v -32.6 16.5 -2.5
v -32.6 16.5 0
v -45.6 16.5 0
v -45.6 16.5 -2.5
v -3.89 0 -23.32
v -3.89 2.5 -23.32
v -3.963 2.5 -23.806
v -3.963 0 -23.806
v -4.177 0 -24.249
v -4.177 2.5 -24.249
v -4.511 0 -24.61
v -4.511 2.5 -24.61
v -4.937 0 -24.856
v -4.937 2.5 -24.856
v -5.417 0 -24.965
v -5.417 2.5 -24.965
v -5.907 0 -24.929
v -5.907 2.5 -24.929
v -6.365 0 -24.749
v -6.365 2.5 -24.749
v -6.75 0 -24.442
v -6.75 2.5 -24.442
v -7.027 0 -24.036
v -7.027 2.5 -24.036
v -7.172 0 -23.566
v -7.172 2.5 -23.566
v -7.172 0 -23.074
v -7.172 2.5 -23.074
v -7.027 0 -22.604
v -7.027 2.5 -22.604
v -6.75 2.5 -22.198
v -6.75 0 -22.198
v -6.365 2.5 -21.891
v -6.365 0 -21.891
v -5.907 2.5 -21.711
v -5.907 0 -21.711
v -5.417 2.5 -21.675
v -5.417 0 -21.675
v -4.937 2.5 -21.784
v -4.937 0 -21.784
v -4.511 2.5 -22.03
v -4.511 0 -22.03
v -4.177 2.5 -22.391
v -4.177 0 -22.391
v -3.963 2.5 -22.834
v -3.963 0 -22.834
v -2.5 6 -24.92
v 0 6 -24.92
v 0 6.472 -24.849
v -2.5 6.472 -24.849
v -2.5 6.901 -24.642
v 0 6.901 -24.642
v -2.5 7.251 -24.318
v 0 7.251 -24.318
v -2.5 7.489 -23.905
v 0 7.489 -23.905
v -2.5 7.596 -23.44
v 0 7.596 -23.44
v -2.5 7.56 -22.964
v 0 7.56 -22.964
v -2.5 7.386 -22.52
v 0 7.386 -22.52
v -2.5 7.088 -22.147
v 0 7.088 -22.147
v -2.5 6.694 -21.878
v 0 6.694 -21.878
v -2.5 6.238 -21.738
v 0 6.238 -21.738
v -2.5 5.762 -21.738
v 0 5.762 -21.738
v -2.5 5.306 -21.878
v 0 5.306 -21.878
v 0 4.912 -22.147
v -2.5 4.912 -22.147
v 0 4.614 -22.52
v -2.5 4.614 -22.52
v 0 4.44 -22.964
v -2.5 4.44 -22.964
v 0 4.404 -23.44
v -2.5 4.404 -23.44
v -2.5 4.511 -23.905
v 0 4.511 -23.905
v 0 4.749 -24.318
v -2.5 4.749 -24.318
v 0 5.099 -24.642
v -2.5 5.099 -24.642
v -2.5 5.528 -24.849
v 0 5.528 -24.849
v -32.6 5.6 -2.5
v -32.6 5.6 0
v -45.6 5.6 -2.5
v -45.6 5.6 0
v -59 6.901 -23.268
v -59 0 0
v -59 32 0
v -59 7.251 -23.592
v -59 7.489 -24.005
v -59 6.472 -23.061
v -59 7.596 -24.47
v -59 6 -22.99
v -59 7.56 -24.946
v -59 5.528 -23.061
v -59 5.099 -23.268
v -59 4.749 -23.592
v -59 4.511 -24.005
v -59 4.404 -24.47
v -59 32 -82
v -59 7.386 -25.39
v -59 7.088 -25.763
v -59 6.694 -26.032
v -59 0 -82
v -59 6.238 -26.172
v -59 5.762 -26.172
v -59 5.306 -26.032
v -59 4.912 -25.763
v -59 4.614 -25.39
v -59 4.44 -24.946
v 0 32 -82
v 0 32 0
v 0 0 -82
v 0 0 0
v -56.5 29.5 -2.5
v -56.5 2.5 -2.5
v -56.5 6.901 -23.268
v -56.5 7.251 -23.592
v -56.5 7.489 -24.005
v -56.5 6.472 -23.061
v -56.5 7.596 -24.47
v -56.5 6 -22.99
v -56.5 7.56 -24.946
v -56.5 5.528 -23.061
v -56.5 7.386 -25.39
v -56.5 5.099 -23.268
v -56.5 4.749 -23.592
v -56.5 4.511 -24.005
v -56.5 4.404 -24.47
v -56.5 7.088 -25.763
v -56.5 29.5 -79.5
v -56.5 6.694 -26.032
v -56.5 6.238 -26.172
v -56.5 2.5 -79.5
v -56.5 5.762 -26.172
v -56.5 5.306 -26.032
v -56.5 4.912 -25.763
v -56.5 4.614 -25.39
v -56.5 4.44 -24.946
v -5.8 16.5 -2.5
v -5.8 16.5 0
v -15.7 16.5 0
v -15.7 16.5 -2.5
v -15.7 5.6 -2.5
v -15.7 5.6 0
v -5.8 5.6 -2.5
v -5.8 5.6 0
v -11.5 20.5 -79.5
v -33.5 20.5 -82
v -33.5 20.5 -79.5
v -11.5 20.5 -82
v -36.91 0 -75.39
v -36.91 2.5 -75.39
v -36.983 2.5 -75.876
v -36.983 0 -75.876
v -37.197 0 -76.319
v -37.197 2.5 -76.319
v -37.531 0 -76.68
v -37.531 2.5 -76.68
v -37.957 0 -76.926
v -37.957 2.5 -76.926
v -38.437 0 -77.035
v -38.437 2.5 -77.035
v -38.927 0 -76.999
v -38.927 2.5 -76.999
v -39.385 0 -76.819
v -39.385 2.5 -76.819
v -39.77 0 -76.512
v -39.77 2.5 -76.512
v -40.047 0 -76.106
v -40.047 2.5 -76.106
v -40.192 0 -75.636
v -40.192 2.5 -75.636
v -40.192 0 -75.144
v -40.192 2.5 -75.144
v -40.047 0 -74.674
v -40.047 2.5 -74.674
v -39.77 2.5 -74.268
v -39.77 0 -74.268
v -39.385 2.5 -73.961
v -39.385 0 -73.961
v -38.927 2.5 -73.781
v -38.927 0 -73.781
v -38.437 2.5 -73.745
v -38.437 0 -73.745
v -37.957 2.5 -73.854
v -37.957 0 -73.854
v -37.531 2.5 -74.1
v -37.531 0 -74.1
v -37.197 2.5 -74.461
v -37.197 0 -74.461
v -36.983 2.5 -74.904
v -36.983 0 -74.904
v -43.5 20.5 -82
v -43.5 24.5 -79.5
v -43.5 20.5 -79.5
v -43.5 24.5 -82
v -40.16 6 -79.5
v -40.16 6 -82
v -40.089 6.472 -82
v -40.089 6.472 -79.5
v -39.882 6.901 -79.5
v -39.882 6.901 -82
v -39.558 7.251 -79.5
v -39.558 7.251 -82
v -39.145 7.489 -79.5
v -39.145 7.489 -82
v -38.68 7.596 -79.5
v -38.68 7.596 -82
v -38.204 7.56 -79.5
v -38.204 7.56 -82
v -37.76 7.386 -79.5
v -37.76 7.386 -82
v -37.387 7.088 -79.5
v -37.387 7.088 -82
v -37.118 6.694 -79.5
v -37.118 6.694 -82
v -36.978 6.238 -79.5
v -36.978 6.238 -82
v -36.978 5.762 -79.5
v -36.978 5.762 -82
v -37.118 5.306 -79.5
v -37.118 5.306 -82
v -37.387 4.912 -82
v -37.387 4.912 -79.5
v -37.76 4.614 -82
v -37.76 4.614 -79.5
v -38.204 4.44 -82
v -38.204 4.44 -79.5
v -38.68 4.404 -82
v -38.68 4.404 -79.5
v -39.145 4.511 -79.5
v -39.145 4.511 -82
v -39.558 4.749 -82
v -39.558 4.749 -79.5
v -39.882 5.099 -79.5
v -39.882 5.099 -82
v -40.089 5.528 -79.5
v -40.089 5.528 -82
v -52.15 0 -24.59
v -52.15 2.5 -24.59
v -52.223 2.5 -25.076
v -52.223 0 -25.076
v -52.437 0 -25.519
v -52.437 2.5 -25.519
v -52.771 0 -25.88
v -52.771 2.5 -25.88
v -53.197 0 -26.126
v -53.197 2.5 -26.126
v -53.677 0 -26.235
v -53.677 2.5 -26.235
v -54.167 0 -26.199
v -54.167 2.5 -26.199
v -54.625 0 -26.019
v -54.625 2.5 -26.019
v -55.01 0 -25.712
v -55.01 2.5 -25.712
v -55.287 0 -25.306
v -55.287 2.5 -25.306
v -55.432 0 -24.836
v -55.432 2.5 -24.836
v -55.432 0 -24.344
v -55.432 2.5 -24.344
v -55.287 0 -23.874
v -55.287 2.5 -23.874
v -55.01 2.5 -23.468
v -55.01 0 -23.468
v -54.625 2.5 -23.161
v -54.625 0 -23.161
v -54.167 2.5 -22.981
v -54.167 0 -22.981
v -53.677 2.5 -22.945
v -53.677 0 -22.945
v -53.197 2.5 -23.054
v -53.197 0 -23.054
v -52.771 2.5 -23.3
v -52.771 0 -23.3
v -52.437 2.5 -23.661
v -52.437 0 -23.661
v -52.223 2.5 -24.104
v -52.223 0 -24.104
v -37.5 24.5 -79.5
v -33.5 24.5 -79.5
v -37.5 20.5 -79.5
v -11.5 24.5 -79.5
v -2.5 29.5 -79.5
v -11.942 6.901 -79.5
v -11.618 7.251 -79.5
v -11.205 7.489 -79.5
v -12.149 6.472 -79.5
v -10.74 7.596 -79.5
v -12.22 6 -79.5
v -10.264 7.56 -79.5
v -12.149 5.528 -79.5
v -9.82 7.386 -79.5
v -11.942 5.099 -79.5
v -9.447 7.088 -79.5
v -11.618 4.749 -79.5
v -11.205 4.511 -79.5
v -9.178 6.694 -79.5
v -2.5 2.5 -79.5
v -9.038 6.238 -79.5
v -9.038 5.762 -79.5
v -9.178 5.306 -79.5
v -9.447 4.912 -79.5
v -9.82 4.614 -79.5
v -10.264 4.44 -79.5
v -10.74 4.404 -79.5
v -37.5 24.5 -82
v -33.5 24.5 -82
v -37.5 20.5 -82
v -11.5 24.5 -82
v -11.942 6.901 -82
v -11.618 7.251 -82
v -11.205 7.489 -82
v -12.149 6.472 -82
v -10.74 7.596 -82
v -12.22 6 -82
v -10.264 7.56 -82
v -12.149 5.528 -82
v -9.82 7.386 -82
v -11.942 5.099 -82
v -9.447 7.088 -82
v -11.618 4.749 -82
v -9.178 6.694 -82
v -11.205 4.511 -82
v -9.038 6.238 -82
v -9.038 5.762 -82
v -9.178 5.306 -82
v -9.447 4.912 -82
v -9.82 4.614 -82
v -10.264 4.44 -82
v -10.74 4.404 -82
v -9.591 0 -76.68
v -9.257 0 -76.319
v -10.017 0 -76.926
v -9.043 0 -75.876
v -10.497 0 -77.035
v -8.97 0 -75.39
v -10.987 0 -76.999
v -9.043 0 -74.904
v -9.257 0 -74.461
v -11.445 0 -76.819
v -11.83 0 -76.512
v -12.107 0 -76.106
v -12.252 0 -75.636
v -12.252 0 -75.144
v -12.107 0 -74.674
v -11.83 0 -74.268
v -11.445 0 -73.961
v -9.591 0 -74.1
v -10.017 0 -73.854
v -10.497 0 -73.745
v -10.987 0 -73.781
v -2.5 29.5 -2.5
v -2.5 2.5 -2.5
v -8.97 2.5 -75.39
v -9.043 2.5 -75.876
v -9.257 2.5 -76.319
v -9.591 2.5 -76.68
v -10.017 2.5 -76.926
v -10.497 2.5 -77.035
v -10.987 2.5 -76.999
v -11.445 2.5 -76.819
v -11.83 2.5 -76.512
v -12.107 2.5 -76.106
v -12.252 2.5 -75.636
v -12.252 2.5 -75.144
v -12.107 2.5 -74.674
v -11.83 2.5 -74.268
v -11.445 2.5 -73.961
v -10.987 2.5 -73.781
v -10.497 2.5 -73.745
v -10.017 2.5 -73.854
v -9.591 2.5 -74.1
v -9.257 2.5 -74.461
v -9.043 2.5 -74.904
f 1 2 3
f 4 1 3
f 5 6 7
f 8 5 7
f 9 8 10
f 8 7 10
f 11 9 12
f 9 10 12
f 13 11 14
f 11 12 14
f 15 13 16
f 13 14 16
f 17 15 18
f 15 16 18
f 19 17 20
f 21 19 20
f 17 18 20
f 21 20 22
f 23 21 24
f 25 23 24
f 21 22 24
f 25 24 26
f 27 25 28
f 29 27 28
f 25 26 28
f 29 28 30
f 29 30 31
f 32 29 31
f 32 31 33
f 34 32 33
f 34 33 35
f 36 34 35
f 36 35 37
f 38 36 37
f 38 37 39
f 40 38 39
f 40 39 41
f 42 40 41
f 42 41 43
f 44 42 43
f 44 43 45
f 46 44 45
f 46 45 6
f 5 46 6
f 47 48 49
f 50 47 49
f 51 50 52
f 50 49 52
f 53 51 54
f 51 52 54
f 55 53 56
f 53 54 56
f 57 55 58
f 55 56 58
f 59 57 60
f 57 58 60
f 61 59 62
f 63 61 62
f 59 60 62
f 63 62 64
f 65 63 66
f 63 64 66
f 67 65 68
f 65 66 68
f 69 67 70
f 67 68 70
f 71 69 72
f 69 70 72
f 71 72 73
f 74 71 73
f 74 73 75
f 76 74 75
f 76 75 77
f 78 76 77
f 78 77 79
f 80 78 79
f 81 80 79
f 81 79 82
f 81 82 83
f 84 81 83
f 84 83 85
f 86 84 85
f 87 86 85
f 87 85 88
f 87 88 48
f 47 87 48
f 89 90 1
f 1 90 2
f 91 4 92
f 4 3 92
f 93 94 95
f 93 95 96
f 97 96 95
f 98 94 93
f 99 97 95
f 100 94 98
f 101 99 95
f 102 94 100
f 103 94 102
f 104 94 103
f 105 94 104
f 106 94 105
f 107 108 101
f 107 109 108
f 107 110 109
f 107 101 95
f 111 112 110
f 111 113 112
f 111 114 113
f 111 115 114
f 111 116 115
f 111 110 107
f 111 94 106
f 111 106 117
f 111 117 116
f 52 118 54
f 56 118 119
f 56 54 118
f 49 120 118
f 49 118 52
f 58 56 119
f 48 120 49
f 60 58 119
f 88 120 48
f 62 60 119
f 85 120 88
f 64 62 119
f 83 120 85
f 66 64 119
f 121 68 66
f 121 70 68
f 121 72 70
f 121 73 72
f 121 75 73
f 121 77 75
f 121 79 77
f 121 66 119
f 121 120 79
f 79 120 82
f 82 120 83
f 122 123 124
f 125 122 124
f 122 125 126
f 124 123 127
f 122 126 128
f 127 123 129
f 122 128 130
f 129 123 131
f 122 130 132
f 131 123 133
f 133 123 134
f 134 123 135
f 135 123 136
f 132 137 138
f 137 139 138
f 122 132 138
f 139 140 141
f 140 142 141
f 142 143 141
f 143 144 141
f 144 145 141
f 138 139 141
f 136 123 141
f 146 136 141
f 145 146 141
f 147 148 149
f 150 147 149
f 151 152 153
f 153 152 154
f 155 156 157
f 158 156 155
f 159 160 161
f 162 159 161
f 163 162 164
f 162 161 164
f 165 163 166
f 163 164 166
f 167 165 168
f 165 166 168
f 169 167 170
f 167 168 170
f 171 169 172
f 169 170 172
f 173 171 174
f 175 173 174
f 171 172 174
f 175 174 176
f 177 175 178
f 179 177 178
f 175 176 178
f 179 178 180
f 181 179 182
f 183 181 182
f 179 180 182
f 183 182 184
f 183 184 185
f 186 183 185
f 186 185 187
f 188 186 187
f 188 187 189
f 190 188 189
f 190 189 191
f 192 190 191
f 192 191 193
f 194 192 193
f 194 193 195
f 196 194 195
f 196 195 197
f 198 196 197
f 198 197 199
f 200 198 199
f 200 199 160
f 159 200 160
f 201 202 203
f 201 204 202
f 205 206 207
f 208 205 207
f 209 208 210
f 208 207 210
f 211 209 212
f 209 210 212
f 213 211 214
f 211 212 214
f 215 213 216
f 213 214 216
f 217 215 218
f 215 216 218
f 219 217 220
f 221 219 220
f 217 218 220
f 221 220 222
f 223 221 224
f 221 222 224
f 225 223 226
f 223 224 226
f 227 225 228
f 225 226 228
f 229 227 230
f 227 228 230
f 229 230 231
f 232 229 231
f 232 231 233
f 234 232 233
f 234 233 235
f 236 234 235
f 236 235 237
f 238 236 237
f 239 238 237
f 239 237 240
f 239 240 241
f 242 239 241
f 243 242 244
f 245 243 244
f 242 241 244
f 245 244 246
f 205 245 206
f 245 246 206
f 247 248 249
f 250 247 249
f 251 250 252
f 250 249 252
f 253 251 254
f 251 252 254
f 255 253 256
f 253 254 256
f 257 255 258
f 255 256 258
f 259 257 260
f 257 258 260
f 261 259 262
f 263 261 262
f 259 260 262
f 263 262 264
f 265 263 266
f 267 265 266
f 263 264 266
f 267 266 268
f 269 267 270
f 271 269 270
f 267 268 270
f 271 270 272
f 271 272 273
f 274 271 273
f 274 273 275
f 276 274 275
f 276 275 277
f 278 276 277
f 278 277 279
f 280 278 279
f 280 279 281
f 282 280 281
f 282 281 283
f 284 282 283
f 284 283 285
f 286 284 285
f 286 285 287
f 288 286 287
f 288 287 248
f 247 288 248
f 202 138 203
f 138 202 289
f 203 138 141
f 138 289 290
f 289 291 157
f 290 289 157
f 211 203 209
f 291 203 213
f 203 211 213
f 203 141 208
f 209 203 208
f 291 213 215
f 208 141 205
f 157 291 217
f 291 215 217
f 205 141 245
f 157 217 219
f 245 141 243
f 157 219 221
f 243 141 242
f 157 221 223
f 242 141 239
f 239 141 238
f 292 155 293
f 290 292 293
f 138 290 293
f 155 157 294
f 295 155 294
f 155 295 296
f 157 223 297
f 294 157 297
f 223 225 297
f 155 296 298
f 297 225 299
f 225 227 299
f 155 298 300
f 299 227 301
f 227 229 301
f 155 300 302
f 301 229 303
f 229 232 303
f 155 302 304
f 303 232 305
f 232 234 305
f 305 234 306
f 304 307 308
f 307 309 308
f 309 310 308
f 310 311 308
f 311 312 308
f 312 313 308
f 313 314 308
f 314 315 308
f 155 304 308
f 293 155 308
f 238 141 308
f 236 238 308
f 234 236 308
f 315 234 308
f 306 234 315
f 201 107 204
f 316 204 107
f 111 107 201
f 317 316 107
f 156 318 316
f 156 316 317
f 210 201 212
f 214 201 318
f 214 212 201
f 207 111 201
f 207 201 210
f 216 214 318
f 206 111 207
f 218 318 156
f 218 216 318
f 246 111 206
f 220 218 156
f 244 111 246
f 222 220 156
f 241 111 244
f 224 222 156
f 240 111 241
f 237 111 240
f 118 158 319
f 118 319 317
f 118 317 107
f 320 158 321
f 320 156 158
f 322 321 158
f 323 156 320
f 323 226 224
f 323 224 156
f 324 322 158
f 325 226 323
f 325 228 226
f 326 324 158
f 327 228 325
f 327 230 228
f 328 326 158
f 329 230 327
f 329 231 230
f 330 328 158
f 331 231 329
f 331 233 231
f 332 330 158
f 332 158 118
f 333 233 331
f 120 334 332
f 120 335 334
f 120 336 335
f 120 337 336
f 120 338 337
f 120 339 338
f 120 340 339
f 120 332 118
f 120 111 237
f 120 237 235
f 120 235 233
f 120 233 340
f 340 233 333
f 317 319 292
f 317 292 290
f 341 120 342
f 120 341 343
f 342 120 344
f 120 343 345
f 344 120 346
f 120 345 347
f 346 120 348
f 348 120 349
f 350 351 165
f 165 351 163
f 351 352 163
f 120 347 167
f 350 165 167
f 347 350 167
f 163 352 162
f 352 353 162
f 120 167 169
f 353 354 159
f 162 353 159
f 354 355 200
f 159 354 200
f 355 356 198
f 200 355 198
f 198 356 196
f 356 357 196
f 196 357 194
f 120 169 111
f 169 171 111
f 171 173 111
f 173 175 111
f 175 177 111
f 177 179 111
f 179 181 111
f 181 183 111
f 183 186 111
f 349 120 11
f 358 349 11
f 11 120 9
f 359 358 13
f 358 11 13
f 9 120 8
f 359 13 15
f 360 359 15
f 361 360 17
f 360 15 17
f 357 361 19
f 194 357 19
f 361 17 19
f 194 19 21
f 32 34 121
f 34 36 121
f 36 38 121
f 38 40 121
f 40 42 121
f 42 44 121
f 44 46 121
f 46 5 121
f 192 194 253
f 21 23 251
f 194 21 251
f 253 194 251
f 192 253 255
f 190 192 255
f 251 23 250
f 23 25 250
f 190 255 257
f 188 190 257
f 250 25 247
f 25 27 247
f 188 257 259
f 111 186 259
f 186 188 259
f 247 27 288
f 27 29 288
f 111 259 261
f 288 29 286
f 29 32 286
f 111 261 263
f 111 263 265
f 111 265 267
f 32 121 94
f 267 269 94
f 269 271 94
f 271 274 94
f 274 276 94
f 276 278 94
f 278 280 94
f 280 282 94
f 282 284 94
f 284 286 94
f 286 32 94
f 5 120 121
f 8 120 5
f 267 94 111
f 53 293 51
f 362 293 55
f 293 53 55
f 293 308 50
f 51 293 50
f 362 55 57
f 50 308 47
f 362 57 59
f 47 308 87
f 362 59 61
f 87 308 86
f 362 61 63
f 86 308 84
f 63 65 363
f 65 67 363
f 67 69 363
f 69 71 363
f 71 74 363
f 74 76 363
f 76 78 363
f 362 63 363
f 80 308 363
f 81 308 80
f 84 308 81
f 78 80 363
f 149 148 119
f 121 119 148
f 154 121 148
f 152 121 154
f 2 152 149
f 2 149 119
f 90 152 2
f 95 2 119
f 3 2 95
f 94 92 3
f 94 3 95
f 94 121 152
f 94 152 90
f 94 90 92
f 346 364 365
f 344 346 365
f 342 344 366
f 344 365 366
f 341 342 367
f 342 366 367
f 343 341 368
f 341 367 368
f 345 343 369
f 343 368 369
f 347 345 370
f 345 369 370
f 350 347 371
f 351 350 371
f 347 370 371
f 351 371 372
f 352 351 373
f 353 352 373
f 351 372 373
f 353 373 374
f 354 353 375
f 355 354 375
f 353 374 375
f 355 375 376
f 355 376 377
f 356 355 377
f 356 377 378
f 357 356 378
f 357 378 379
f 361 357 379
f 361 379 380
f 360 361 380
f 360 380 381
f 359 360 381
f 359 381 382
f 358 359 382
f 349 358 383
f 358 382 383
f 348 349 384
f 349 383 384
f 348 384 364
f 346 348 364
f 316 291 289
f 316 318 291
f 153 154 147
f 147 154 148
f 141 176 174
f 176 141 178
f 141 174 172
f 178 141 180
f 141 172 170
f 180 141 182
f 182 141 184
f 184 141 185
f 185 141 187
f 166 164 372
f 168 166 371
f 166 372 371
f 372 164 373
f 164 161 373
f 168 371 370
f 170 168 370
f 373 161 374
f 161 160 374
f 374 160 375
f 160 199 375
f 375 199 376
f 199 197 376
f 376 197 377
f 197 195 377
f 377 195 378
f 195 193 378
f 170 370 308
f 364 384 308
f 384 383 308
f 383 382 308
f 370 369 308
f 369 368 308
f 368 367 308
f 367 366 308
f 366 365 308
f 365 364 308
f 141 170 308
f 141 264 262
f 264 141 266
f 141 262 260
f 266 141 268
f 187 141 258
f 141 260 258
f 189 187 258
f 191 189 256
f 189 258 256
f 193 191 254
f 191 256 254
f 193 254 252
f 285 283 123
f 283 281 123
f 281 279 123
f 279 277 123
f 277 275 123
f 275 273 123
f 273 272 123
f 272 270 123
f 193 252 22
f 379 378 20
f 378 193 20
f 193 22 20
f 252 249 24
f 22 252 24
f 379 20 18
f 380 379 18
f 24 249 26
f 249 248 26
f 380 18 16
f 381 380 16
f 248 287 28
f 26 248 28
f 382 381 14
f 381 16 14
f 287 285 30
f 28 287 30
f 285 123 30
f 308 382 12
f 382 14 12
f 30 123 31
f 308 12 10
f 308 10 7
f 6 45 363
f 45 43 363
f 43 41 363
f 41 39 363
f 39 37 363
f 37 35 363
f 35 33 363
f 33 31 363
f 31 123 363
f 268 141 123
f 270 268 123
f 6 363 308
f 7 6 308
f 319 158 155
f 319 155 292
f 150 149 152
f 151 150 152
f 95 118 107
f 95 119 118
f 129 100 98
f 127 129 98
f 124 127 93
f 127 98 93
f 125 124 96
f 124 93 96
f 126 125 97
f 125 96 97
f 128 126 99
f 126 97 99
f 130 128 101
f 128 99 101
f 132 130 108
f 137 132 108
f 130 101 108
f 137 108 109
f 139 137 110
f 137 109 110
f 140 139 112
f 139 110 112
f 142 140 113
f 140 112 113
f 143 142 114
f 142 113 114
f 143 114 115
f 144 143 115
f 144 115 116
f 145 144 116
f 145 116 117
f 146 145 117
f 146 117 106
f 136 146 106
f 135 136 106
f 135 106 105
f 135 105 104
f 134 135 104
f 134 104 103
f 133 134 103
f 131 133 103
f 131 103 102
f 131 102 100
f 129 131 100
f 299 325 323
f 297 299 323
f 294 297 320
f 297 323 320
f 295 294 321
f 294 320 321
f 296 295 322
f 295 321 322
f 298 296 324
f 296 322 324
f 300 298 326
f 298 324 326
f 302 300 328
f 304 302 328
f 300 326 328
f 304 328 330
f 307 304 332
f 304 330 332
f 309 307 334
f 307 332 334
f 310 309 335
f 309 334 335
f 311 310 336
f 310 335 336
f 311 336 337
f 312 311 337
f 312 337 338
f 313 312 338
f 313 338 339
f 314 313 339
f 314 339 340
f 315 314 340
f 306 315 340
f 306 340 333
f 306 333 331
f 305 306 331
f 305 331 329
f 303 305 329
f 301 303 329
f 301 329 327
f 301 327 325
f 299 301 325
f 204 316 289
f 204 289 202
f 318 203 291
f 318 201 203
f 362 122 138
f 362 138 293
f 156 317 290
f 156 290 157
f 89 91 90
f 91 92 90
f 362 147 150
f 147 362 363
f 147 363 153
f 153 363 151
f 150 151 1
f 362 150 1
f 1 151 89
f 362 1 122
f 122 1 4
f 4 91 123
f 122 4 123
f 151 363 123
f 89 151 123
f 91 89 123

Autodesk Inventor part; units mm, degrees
ref_plane "YZ Plane" through (0, 0, 0) normal (1, 0, 0) x (0, 1, 0)
ref_plane "XZ Plane" through (0, 0, 0) normal (0, 1, 0) x (-1, 0, 0)
sketch "Sketch1" plane through (0, 0, 0) normal (0, 1, 0) x (-1, 0, 0)
  line L0 (0, 0) -> (59, 0)
  line L1 (59, 0) -> (59, -82)
  line L2 (59, -82) -> (0, -82)
  line L3 (0, -82) -> (0, 0)
  dimension "d0" = 82
  dimension "d1" = 59
extrude "Extrusion1" add sketch "Sketch1" along normal blind 32
ref_plane "Work Plane1" through (0, 2.5, 0) normal (0, -1, 0) x (1, 0, 0)
sketch "Sketch2" plane through (0, 2.5, 0) normal (0, -1, 0) x (1, 0, 0)
  line L0 (-2.5, -2.5) -> (-56.5, -2.5)
  line L1 (-56.5, -2.5) -> (-56.5, -79.5)
  line L2 (-56.5, -79.5) -> (-2.5, -79.5)
  line L3 (-2.5, -79.5) -> (-2.5, -2.5)
  line L4 (0, 0) -> (0, -82) projected
  line L5 (-59, 0) -> (0, 0) projected
  line L6 (-59, -82) -> (-59, 0) projected
  line L7 (0, -82) -> (-59, -82) projected
  dimension "d5" = 2.5
  dimension "d6" = 2.5
  dimension "d7" = 2.5
  dimension "d8" = 2.5
extrude "Extrusion2" cut sketch "Sketch2" against normal blind 27 contours L3 L2 L1 L0
sketch "Sketch3" plane through (0, 2.5, 0) normal (0, -1, 0) x (1, 0, 0)
  line L0 (-3, -3) -> (-56, -3) construction
  line L1 (-56, -3) -> (-56, -79) construction
  line L2 (-56, -79) -> (-3, -79) construction
  line L3 (-3, -79) -> (-3, -3) construction
  line L4 (-2.5, -2.5) -> (-2.5, -79.5) projected
  line L5 (-56.5, -2.5) -> (-2.5, -2.5) projected
  line L6 (-56.5, -79.5) -> (-56.5, -2.5) projected
  line L7 (-2.5, -79.5) -> (-56.5, -79.5) projected
  circle A0 centre (-53.8, -24.59) radius 1.65
  circle A1 centre (-5.54, -23.32) radius 1.65
  circle A2 centre (-38.56, -75.39) radius 1.65
  circle A3 centre (-10.62, -75.39) radius 1.65
  point P0 (0, 0)
  dimension "d11" = 0.5
  dimension "d12" = 0.5
  dimension "d13" = 0.5
  dimension "d14" = 0.5
  dimension "d15" = 3.3
  dimension "d16" = 20.32
  dimension "d17" = 2.54
  dimension "d18" = 7.62
  dimension "d19" = 72.39
  dimension "d20" = 21.59
  dimension "d22" = 50.8
  dimension "d23" = 35.56
  dimension "d24" = 72.39
extrude "Extrusion3" cut sketch "Sketch3" along normal blind 27 contours A0 | A1 | A2 | A3
sketch "Sketch4" plane through (-59, 0, 0) normal (0, 0, 1) x (1, 0, 0)
  line L0 (13.4, 5.6) -> (26.4, 5.6)
  line L1 (26.4, 5.6) -> (26.4, 16.5)
  line L2 (26.4, 16.5) -> (13.4, 16.5)
  line L3 (13.4, 16.5) -> (13.4, 5.6)
  line L4 (43.3, 5.6) -> (53.2, 5.6)
  line L5 (53.2, 5.6) -> (53.2, 16.5)
  line L6 (53.2, 16.5) -> (43.3, 16.5)
  line L7 (43.3, 16.5) -> (43.3, 5.6)
  line L8 (56.5, 2.5) -> (2.5, 2.5) projected
  line L9 (2.5, 2.5) -> (2.5, 29.5) projected
  line L10 (56.5, 2.5) -> (56.5, 29.5) projected
  point P0 (59, 0)
  dimension "d27" = 13
  dimension "d28" = 10.9
  dimension "d29" = 9.9
  dimension "d31" = 14
  dimension "d32" = 10.9
  dimension "d33" = 3.3
extrude "Extrusion4" cut sketch "Sketch4" against normal blind 5
sketch "Sketch5" plane through (0, 0, -82) normal (0, 0, -1) x (-1, 0, 0)
  line L0 (11.5, 24.5) -> (33.5, 24.5)
  line L1 (33.5, 24.5) -> (33.5, 20.5)
  line L2 (33.5, 20.5) -> (11.5, 20.5)
  line L3 (11.5, 20.5) -> (11.5, 24.5)
  line L4 (37.5, 24.5) -> (43.5, 24.5)
  line L5 (43.5, 24.5) -> (43.5, 20.5)
  line L6 (43.5, 20.5) -> (37.5, 20.5)
  line L7 (37.5, 20.5) -> (37.5, 24.5)
  line L8 (56.5, 2.5) -> (2.5, 2.5) projected
  line L9 (2.5, 2.5) -> (2.5, 29.5) projected
  point P0 (0, 0)
  dimension "d36" = 22
  dimension "d37" = 4
  dimension "d38" = 4
  dimension "d39" = 22
  dimension "d40" = 9
  dimension "d41" = 6
  dimension "d42" = 4
extrude "Extrusion5" cut sketch "Sketch5" against normal blind 5
sketch "Sketch6" plane through (-59, 0, -82) normal (-1, 0, 0) x (0, 0, 1)
  circle A0 centre (57.41, 6) radius 1.6
  line L0 (79.5, 2.5) -> (79.5, 29.5) projected
  line L1 (82, 0) -> (0, 0) projected
  dimension "d45" = 3.2
  dimension "d46" = 22.09
  dimension "d47" = 6
sketch "Sketch7" plane through (0, 0, 0) normal (1, 0, 0) x (0, 0, -1)
  circle A0 centre (23.32, 6) radius 1.6
  line L0 (82, 0) -> (0, 0) projected
  line L1 (2.5, 2.5) -> (2.5, 29.5) projected
  dimension "d48" = 6
  dimension "d49" = 20.82
  dimension "d50" = 3.2
sketch "Sketch8" plane through (0, 0, -82) normal (0, 0, -1) x (-1, 0, 0)
  circle A0 centre (10.62, 6) radius 1.6
  circle A1 centre (38.56, 6) radius 1.6
  line L0 (59, 0) -> (0, 0) projected
  line L1 (2.5, 2.5) -> (2.5, 29.5) projected
  dimension "d51" = 3.2
  dimension "d52" = 3.2
  dimension "d53" = 6
  dimension "d54" = 6
  dimension "d55" = 8.12
  dimension "d56" = 36.06
extrude "Extrusion6" cut sketch "Sketch6" against normal blind 5
extrude "Extrusion7" cut sketch "Sketch7" against normal blind 5
extrude "Extrusion8" cut sketch "Sketch8" against normal blind 5
sketch "Sketch9" plane through (-59, 0, 0) normal (0, 0, 1) x (1, 0, 0)
  line L0 (-2.1645, 16) -> (66.4826, 16)
  line L1 (59, 0) -> (0, 0) projected
  dimension "d63" = 16
properties part number "Arduino_Box"
